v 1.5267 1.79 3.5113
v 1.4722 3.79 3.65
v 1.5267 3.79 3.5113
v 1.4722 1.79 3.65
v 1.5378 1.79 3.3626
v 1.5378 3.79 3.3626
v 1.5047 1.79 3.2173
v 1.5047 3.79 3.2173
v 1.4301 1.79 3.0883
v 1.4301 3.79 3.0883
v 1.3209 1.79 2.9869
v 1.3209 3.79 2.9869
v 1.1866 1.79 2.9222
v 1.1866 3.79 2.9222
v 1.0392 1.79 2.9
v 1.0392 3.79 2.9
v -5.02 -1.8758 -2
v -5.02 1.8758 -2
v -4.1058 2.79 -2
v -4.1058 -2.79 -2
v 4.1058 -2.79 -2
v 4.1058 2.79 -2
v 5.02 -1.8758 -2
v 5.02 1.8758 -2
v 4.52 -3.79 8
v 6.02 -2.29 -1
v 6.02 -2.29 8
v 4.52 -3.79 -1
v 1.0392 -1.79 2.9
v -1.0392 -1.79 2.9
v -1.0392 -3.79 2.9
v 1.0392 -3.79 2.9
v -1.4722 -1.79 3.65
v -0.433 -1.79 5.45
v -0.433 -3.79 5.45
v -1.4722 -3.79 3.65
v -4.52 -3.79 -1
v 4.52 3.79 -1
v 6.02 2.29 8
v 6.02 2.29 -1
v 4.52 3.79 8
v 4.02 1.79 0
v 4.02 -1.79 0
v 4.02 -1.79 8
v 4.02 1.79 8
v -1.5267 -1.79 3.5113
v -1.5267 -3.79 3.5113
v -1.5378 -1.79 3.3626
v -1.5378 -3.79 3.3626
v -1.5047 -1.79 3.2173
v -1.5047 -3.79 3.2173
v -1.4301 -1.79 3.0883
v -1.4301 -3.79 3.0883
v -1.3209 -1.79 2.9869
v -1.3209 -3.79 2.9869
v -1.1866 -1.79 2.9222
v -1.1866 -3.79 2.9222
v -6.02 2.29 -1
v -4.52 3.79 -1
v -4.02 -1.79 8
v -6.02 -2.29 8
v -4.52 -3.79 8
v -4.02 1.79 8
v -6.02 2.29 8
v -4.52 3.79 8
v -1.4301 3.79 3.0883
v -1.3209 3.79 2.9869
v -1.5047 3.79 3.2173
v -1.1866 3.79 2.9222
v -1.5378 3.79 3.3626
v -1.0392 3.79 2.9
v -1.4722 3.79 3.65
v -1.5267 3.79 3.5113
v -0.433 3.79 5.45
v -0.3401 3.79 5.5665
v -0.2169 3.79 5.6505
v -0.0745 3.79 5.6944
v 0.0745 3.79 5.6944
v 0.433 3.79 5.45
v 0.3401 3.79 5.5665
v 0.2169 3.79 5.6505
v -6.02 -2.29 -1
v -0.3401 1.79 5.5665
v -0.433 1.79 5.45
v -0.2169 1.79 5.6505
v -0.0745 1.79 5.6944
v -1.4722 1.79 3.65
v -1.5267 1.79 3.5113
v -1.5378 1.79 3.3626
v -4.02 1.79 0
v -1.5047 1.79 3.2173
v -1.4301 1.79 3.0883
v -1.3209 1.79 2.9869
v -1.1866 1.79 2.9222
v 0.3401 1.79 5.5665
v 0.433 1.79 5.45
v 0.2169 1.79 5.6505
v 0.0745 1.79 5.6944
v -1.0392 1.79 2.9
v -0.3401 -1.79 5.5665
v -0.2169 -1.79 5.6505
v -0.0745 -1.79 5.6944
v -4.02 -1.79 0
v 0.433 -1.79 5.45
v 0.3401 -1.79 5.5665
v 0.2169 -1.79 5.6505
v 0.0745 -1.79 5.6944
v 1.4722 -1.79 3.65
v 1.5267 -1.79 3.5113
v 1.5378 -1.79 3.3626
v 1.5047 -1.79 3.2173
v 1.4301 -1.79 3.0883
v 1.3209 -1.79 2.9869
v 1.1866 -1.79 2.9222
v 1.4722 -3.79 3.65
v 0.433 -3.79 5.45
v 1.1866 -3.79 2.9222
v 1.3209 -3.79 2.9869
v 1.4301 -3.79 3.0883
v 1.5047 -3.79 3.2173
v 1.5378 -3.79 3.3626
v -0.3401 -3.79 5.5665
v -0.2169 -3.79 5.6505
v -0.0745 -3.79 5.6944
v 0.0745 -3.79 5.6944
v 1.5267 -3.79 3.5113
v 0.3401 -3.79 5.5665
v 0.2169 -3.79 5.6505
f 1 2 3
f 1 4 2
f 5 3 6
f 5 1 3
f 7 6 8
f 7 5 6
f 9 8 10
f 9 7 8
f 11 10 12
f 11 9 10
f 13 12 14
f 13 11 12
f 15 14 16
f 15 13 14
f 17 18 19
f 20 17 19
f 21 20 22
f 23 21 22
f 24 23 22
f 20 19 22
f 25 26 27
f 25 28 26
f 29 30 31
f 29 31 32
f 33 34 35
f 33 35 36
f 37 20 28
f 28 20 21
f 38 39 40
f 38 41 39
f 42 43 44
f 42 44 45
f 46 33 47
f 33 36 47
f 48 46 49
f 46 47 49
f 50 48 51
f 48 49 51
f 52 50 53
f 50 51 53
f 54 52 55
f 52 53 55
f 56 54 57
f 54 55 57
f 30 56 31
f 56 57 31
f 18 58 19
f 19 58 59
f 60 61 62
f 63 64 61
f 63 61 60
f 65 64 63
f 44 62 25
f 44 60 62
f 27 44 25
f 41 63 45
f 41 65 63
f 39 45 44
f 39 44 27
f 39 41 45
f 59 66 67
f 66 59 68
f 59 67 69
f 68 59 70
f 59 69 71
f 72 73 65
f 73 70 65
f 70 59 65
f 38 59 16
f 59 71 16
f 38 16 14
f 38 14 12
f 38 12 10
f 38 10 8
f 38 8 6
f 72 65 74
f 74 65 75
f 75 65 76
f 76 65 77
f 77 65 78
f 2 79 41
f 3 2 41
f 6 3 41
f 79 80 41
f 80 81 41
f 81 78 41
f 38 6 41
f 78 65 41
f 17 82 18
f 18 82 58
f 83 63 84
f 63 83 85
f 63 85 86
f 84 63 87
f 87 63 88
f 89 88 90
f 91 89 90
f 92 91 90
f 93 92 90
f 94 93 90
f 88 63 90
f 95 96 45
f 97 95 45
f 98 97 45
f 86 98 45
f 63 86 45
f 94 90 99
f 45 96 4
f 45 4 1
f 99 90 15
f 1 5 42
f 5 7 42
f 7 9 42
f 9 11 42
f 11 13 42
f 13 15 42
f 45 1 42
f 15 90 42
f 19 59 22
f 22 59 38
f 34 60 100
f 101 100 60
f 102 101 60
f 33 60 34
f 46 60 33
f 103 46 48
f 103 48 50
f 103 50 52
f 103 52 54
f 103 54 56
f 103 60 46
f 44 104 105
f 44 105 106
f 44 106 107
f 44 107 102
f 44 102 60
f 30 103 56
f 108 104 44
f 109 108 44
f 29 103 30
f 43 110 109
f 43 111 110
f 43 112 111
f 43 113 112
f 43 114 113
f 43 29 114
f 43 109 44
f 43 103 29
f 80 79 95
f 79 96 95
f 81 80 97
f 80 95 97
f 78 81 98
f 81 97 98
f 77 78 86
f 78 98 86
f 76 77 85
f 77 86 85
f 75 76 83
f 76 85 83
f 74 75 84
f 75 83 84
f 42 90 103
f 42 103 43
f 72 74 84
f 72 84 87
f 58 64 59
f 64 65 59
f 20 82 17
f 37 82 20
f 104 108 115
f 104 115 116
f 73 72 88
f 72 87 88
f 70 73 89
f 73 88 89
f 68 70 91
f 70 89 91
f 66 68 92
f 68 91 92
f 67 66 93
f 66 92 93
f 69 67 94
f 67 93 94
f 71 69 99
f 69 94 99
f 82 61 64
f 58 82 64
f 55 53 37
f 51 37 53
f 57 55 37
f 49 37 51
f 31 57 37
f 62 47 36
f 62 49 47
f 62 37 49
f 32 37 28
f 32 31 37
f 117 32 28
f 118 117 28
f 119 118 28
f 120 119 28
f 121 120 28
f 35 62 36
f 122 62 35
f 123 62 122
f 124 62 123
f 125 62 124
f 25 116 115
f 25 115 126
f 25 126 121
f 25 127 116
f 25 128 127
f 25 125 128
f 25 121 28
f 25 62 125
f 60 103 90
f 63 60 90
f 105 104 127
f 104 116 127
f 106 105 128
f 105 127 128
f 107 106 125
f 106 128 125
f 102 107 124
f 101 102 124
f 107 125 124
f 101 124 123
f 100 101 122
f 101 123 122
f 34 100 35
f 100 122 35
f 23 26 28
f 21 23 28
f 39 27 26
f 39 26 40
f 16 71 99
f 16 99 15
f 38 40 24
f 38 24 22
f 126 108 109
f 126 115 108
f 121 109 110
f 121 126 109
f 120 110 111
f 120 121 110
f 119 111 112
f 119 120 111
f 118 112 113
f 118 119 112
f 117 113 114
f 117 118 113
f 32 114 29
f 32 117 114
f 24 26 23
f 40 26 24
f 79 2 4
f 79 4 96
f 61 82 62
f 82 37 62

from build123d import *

# Parameters (mm, degrees)
SKETCH1_W               = 12.04
SKETCH1_H               = 7.58
SKETCH1_W_2             = 8.04
SKETCH1_H_2             = 3.58
BOSS_EXTRUDE1_DEPTH     = 8
SKETCH1_2_W             = 12.04
SKETCH1_2_H             = 7.58
BOSS_EXTRUDE2_DEPTH     = 2
CHAMFER1_SIZE           = 1.5
CUT_EXTRUDE1_DEPTH      = 13.55773865
CUT_EXTRUDE1_DEPTH_BACK = 13.55773865
FILLET1_R               = 0.5
CHAMFER2_SIZE           = 1


with BuildPart() as part:
    # Sketch1 → Boss-Extrude1 (new body)
    with BuildSketch(Plane.XY):
        Rectangle(SKETCH1_W, SKETCH1_H)
        Rectangle(SKETCH1_W_2, SKETCH1_H_2, mode=Mode.SUBTRACT)
    extrude(amount=BOSS_EXTRUDE1_DEPTH)

    # Sketch1<2> → Boss-Extrude2 (add)
    with BuildSketch(Plane.XY):
        Rectangle(SKETCH1_2_W, SKETCH1_2_H)
    extrude(amount=-BOSS_EXTRUDE2_DEPTH)

    # Chamfer1
    chamfer1_edges = [part.edges().sort_by_distance(p)[0] for p in [
        (-6.02, -3.79, 3),
        (-6.02, 3.79, 3),
        (6.02, 3.79, 3),
        (6.02, -3.79, 3),
    ]]
    chamfer(chamfer1_edges, length=CHAMFER1_SIZE)

    # Sketch2 → Cut-Extrude1 (cut, two sides: drawn at the far end of the back side and taken through both)
    with BuildSketch(Plane.XZ.offset(3.79).offset(-CUT_EXTRUDE1_DEPTH_BACK)):
        Polygon((-1.905255888, 2.9), (1.905255888, 2.9), (0, 6.2), align=None)
    extrude(amount=CUT_EXTRUDE1_DEPTH + CUT_EXTRUDE1_DEPTH_BACK, mode=Mode.SUBTRACT)

    # Fillet1
    fillet1_edges = [part.edges().sort_by_distance(p)[0] for p in [
        (-1.905255888, 2.79, 2.9),
        (0, 2.79, 6.2),
        (1.905255888, 2.79, 2.9),
        (1.905255888, -2.79, 2.9),
        (0, -2.79, 6.2),
        (-1.905255888, -2.79, 2.9),
    ]]
    fillet(fillet1_edges, radius=FILLET1_R)

    # Chamfer2
    chamfer2_edges = [part.edges().sort_by_distance(p)[0] for p in [
        (5.27, -3.04, -2),
        (6.02, 0, -2),
        (5.27, 3.04, -2),
        (0, 3.79, -2),
        (-5.27, 3.04, -2),
        (-6.02, 0, -2),
        (-5.27, -3.04, -2),
        (0, -3.79, -2),
    ]]
    chamfer(chamfer2_edges, length=CHAMFER2_SIZE)


solid = part.part
